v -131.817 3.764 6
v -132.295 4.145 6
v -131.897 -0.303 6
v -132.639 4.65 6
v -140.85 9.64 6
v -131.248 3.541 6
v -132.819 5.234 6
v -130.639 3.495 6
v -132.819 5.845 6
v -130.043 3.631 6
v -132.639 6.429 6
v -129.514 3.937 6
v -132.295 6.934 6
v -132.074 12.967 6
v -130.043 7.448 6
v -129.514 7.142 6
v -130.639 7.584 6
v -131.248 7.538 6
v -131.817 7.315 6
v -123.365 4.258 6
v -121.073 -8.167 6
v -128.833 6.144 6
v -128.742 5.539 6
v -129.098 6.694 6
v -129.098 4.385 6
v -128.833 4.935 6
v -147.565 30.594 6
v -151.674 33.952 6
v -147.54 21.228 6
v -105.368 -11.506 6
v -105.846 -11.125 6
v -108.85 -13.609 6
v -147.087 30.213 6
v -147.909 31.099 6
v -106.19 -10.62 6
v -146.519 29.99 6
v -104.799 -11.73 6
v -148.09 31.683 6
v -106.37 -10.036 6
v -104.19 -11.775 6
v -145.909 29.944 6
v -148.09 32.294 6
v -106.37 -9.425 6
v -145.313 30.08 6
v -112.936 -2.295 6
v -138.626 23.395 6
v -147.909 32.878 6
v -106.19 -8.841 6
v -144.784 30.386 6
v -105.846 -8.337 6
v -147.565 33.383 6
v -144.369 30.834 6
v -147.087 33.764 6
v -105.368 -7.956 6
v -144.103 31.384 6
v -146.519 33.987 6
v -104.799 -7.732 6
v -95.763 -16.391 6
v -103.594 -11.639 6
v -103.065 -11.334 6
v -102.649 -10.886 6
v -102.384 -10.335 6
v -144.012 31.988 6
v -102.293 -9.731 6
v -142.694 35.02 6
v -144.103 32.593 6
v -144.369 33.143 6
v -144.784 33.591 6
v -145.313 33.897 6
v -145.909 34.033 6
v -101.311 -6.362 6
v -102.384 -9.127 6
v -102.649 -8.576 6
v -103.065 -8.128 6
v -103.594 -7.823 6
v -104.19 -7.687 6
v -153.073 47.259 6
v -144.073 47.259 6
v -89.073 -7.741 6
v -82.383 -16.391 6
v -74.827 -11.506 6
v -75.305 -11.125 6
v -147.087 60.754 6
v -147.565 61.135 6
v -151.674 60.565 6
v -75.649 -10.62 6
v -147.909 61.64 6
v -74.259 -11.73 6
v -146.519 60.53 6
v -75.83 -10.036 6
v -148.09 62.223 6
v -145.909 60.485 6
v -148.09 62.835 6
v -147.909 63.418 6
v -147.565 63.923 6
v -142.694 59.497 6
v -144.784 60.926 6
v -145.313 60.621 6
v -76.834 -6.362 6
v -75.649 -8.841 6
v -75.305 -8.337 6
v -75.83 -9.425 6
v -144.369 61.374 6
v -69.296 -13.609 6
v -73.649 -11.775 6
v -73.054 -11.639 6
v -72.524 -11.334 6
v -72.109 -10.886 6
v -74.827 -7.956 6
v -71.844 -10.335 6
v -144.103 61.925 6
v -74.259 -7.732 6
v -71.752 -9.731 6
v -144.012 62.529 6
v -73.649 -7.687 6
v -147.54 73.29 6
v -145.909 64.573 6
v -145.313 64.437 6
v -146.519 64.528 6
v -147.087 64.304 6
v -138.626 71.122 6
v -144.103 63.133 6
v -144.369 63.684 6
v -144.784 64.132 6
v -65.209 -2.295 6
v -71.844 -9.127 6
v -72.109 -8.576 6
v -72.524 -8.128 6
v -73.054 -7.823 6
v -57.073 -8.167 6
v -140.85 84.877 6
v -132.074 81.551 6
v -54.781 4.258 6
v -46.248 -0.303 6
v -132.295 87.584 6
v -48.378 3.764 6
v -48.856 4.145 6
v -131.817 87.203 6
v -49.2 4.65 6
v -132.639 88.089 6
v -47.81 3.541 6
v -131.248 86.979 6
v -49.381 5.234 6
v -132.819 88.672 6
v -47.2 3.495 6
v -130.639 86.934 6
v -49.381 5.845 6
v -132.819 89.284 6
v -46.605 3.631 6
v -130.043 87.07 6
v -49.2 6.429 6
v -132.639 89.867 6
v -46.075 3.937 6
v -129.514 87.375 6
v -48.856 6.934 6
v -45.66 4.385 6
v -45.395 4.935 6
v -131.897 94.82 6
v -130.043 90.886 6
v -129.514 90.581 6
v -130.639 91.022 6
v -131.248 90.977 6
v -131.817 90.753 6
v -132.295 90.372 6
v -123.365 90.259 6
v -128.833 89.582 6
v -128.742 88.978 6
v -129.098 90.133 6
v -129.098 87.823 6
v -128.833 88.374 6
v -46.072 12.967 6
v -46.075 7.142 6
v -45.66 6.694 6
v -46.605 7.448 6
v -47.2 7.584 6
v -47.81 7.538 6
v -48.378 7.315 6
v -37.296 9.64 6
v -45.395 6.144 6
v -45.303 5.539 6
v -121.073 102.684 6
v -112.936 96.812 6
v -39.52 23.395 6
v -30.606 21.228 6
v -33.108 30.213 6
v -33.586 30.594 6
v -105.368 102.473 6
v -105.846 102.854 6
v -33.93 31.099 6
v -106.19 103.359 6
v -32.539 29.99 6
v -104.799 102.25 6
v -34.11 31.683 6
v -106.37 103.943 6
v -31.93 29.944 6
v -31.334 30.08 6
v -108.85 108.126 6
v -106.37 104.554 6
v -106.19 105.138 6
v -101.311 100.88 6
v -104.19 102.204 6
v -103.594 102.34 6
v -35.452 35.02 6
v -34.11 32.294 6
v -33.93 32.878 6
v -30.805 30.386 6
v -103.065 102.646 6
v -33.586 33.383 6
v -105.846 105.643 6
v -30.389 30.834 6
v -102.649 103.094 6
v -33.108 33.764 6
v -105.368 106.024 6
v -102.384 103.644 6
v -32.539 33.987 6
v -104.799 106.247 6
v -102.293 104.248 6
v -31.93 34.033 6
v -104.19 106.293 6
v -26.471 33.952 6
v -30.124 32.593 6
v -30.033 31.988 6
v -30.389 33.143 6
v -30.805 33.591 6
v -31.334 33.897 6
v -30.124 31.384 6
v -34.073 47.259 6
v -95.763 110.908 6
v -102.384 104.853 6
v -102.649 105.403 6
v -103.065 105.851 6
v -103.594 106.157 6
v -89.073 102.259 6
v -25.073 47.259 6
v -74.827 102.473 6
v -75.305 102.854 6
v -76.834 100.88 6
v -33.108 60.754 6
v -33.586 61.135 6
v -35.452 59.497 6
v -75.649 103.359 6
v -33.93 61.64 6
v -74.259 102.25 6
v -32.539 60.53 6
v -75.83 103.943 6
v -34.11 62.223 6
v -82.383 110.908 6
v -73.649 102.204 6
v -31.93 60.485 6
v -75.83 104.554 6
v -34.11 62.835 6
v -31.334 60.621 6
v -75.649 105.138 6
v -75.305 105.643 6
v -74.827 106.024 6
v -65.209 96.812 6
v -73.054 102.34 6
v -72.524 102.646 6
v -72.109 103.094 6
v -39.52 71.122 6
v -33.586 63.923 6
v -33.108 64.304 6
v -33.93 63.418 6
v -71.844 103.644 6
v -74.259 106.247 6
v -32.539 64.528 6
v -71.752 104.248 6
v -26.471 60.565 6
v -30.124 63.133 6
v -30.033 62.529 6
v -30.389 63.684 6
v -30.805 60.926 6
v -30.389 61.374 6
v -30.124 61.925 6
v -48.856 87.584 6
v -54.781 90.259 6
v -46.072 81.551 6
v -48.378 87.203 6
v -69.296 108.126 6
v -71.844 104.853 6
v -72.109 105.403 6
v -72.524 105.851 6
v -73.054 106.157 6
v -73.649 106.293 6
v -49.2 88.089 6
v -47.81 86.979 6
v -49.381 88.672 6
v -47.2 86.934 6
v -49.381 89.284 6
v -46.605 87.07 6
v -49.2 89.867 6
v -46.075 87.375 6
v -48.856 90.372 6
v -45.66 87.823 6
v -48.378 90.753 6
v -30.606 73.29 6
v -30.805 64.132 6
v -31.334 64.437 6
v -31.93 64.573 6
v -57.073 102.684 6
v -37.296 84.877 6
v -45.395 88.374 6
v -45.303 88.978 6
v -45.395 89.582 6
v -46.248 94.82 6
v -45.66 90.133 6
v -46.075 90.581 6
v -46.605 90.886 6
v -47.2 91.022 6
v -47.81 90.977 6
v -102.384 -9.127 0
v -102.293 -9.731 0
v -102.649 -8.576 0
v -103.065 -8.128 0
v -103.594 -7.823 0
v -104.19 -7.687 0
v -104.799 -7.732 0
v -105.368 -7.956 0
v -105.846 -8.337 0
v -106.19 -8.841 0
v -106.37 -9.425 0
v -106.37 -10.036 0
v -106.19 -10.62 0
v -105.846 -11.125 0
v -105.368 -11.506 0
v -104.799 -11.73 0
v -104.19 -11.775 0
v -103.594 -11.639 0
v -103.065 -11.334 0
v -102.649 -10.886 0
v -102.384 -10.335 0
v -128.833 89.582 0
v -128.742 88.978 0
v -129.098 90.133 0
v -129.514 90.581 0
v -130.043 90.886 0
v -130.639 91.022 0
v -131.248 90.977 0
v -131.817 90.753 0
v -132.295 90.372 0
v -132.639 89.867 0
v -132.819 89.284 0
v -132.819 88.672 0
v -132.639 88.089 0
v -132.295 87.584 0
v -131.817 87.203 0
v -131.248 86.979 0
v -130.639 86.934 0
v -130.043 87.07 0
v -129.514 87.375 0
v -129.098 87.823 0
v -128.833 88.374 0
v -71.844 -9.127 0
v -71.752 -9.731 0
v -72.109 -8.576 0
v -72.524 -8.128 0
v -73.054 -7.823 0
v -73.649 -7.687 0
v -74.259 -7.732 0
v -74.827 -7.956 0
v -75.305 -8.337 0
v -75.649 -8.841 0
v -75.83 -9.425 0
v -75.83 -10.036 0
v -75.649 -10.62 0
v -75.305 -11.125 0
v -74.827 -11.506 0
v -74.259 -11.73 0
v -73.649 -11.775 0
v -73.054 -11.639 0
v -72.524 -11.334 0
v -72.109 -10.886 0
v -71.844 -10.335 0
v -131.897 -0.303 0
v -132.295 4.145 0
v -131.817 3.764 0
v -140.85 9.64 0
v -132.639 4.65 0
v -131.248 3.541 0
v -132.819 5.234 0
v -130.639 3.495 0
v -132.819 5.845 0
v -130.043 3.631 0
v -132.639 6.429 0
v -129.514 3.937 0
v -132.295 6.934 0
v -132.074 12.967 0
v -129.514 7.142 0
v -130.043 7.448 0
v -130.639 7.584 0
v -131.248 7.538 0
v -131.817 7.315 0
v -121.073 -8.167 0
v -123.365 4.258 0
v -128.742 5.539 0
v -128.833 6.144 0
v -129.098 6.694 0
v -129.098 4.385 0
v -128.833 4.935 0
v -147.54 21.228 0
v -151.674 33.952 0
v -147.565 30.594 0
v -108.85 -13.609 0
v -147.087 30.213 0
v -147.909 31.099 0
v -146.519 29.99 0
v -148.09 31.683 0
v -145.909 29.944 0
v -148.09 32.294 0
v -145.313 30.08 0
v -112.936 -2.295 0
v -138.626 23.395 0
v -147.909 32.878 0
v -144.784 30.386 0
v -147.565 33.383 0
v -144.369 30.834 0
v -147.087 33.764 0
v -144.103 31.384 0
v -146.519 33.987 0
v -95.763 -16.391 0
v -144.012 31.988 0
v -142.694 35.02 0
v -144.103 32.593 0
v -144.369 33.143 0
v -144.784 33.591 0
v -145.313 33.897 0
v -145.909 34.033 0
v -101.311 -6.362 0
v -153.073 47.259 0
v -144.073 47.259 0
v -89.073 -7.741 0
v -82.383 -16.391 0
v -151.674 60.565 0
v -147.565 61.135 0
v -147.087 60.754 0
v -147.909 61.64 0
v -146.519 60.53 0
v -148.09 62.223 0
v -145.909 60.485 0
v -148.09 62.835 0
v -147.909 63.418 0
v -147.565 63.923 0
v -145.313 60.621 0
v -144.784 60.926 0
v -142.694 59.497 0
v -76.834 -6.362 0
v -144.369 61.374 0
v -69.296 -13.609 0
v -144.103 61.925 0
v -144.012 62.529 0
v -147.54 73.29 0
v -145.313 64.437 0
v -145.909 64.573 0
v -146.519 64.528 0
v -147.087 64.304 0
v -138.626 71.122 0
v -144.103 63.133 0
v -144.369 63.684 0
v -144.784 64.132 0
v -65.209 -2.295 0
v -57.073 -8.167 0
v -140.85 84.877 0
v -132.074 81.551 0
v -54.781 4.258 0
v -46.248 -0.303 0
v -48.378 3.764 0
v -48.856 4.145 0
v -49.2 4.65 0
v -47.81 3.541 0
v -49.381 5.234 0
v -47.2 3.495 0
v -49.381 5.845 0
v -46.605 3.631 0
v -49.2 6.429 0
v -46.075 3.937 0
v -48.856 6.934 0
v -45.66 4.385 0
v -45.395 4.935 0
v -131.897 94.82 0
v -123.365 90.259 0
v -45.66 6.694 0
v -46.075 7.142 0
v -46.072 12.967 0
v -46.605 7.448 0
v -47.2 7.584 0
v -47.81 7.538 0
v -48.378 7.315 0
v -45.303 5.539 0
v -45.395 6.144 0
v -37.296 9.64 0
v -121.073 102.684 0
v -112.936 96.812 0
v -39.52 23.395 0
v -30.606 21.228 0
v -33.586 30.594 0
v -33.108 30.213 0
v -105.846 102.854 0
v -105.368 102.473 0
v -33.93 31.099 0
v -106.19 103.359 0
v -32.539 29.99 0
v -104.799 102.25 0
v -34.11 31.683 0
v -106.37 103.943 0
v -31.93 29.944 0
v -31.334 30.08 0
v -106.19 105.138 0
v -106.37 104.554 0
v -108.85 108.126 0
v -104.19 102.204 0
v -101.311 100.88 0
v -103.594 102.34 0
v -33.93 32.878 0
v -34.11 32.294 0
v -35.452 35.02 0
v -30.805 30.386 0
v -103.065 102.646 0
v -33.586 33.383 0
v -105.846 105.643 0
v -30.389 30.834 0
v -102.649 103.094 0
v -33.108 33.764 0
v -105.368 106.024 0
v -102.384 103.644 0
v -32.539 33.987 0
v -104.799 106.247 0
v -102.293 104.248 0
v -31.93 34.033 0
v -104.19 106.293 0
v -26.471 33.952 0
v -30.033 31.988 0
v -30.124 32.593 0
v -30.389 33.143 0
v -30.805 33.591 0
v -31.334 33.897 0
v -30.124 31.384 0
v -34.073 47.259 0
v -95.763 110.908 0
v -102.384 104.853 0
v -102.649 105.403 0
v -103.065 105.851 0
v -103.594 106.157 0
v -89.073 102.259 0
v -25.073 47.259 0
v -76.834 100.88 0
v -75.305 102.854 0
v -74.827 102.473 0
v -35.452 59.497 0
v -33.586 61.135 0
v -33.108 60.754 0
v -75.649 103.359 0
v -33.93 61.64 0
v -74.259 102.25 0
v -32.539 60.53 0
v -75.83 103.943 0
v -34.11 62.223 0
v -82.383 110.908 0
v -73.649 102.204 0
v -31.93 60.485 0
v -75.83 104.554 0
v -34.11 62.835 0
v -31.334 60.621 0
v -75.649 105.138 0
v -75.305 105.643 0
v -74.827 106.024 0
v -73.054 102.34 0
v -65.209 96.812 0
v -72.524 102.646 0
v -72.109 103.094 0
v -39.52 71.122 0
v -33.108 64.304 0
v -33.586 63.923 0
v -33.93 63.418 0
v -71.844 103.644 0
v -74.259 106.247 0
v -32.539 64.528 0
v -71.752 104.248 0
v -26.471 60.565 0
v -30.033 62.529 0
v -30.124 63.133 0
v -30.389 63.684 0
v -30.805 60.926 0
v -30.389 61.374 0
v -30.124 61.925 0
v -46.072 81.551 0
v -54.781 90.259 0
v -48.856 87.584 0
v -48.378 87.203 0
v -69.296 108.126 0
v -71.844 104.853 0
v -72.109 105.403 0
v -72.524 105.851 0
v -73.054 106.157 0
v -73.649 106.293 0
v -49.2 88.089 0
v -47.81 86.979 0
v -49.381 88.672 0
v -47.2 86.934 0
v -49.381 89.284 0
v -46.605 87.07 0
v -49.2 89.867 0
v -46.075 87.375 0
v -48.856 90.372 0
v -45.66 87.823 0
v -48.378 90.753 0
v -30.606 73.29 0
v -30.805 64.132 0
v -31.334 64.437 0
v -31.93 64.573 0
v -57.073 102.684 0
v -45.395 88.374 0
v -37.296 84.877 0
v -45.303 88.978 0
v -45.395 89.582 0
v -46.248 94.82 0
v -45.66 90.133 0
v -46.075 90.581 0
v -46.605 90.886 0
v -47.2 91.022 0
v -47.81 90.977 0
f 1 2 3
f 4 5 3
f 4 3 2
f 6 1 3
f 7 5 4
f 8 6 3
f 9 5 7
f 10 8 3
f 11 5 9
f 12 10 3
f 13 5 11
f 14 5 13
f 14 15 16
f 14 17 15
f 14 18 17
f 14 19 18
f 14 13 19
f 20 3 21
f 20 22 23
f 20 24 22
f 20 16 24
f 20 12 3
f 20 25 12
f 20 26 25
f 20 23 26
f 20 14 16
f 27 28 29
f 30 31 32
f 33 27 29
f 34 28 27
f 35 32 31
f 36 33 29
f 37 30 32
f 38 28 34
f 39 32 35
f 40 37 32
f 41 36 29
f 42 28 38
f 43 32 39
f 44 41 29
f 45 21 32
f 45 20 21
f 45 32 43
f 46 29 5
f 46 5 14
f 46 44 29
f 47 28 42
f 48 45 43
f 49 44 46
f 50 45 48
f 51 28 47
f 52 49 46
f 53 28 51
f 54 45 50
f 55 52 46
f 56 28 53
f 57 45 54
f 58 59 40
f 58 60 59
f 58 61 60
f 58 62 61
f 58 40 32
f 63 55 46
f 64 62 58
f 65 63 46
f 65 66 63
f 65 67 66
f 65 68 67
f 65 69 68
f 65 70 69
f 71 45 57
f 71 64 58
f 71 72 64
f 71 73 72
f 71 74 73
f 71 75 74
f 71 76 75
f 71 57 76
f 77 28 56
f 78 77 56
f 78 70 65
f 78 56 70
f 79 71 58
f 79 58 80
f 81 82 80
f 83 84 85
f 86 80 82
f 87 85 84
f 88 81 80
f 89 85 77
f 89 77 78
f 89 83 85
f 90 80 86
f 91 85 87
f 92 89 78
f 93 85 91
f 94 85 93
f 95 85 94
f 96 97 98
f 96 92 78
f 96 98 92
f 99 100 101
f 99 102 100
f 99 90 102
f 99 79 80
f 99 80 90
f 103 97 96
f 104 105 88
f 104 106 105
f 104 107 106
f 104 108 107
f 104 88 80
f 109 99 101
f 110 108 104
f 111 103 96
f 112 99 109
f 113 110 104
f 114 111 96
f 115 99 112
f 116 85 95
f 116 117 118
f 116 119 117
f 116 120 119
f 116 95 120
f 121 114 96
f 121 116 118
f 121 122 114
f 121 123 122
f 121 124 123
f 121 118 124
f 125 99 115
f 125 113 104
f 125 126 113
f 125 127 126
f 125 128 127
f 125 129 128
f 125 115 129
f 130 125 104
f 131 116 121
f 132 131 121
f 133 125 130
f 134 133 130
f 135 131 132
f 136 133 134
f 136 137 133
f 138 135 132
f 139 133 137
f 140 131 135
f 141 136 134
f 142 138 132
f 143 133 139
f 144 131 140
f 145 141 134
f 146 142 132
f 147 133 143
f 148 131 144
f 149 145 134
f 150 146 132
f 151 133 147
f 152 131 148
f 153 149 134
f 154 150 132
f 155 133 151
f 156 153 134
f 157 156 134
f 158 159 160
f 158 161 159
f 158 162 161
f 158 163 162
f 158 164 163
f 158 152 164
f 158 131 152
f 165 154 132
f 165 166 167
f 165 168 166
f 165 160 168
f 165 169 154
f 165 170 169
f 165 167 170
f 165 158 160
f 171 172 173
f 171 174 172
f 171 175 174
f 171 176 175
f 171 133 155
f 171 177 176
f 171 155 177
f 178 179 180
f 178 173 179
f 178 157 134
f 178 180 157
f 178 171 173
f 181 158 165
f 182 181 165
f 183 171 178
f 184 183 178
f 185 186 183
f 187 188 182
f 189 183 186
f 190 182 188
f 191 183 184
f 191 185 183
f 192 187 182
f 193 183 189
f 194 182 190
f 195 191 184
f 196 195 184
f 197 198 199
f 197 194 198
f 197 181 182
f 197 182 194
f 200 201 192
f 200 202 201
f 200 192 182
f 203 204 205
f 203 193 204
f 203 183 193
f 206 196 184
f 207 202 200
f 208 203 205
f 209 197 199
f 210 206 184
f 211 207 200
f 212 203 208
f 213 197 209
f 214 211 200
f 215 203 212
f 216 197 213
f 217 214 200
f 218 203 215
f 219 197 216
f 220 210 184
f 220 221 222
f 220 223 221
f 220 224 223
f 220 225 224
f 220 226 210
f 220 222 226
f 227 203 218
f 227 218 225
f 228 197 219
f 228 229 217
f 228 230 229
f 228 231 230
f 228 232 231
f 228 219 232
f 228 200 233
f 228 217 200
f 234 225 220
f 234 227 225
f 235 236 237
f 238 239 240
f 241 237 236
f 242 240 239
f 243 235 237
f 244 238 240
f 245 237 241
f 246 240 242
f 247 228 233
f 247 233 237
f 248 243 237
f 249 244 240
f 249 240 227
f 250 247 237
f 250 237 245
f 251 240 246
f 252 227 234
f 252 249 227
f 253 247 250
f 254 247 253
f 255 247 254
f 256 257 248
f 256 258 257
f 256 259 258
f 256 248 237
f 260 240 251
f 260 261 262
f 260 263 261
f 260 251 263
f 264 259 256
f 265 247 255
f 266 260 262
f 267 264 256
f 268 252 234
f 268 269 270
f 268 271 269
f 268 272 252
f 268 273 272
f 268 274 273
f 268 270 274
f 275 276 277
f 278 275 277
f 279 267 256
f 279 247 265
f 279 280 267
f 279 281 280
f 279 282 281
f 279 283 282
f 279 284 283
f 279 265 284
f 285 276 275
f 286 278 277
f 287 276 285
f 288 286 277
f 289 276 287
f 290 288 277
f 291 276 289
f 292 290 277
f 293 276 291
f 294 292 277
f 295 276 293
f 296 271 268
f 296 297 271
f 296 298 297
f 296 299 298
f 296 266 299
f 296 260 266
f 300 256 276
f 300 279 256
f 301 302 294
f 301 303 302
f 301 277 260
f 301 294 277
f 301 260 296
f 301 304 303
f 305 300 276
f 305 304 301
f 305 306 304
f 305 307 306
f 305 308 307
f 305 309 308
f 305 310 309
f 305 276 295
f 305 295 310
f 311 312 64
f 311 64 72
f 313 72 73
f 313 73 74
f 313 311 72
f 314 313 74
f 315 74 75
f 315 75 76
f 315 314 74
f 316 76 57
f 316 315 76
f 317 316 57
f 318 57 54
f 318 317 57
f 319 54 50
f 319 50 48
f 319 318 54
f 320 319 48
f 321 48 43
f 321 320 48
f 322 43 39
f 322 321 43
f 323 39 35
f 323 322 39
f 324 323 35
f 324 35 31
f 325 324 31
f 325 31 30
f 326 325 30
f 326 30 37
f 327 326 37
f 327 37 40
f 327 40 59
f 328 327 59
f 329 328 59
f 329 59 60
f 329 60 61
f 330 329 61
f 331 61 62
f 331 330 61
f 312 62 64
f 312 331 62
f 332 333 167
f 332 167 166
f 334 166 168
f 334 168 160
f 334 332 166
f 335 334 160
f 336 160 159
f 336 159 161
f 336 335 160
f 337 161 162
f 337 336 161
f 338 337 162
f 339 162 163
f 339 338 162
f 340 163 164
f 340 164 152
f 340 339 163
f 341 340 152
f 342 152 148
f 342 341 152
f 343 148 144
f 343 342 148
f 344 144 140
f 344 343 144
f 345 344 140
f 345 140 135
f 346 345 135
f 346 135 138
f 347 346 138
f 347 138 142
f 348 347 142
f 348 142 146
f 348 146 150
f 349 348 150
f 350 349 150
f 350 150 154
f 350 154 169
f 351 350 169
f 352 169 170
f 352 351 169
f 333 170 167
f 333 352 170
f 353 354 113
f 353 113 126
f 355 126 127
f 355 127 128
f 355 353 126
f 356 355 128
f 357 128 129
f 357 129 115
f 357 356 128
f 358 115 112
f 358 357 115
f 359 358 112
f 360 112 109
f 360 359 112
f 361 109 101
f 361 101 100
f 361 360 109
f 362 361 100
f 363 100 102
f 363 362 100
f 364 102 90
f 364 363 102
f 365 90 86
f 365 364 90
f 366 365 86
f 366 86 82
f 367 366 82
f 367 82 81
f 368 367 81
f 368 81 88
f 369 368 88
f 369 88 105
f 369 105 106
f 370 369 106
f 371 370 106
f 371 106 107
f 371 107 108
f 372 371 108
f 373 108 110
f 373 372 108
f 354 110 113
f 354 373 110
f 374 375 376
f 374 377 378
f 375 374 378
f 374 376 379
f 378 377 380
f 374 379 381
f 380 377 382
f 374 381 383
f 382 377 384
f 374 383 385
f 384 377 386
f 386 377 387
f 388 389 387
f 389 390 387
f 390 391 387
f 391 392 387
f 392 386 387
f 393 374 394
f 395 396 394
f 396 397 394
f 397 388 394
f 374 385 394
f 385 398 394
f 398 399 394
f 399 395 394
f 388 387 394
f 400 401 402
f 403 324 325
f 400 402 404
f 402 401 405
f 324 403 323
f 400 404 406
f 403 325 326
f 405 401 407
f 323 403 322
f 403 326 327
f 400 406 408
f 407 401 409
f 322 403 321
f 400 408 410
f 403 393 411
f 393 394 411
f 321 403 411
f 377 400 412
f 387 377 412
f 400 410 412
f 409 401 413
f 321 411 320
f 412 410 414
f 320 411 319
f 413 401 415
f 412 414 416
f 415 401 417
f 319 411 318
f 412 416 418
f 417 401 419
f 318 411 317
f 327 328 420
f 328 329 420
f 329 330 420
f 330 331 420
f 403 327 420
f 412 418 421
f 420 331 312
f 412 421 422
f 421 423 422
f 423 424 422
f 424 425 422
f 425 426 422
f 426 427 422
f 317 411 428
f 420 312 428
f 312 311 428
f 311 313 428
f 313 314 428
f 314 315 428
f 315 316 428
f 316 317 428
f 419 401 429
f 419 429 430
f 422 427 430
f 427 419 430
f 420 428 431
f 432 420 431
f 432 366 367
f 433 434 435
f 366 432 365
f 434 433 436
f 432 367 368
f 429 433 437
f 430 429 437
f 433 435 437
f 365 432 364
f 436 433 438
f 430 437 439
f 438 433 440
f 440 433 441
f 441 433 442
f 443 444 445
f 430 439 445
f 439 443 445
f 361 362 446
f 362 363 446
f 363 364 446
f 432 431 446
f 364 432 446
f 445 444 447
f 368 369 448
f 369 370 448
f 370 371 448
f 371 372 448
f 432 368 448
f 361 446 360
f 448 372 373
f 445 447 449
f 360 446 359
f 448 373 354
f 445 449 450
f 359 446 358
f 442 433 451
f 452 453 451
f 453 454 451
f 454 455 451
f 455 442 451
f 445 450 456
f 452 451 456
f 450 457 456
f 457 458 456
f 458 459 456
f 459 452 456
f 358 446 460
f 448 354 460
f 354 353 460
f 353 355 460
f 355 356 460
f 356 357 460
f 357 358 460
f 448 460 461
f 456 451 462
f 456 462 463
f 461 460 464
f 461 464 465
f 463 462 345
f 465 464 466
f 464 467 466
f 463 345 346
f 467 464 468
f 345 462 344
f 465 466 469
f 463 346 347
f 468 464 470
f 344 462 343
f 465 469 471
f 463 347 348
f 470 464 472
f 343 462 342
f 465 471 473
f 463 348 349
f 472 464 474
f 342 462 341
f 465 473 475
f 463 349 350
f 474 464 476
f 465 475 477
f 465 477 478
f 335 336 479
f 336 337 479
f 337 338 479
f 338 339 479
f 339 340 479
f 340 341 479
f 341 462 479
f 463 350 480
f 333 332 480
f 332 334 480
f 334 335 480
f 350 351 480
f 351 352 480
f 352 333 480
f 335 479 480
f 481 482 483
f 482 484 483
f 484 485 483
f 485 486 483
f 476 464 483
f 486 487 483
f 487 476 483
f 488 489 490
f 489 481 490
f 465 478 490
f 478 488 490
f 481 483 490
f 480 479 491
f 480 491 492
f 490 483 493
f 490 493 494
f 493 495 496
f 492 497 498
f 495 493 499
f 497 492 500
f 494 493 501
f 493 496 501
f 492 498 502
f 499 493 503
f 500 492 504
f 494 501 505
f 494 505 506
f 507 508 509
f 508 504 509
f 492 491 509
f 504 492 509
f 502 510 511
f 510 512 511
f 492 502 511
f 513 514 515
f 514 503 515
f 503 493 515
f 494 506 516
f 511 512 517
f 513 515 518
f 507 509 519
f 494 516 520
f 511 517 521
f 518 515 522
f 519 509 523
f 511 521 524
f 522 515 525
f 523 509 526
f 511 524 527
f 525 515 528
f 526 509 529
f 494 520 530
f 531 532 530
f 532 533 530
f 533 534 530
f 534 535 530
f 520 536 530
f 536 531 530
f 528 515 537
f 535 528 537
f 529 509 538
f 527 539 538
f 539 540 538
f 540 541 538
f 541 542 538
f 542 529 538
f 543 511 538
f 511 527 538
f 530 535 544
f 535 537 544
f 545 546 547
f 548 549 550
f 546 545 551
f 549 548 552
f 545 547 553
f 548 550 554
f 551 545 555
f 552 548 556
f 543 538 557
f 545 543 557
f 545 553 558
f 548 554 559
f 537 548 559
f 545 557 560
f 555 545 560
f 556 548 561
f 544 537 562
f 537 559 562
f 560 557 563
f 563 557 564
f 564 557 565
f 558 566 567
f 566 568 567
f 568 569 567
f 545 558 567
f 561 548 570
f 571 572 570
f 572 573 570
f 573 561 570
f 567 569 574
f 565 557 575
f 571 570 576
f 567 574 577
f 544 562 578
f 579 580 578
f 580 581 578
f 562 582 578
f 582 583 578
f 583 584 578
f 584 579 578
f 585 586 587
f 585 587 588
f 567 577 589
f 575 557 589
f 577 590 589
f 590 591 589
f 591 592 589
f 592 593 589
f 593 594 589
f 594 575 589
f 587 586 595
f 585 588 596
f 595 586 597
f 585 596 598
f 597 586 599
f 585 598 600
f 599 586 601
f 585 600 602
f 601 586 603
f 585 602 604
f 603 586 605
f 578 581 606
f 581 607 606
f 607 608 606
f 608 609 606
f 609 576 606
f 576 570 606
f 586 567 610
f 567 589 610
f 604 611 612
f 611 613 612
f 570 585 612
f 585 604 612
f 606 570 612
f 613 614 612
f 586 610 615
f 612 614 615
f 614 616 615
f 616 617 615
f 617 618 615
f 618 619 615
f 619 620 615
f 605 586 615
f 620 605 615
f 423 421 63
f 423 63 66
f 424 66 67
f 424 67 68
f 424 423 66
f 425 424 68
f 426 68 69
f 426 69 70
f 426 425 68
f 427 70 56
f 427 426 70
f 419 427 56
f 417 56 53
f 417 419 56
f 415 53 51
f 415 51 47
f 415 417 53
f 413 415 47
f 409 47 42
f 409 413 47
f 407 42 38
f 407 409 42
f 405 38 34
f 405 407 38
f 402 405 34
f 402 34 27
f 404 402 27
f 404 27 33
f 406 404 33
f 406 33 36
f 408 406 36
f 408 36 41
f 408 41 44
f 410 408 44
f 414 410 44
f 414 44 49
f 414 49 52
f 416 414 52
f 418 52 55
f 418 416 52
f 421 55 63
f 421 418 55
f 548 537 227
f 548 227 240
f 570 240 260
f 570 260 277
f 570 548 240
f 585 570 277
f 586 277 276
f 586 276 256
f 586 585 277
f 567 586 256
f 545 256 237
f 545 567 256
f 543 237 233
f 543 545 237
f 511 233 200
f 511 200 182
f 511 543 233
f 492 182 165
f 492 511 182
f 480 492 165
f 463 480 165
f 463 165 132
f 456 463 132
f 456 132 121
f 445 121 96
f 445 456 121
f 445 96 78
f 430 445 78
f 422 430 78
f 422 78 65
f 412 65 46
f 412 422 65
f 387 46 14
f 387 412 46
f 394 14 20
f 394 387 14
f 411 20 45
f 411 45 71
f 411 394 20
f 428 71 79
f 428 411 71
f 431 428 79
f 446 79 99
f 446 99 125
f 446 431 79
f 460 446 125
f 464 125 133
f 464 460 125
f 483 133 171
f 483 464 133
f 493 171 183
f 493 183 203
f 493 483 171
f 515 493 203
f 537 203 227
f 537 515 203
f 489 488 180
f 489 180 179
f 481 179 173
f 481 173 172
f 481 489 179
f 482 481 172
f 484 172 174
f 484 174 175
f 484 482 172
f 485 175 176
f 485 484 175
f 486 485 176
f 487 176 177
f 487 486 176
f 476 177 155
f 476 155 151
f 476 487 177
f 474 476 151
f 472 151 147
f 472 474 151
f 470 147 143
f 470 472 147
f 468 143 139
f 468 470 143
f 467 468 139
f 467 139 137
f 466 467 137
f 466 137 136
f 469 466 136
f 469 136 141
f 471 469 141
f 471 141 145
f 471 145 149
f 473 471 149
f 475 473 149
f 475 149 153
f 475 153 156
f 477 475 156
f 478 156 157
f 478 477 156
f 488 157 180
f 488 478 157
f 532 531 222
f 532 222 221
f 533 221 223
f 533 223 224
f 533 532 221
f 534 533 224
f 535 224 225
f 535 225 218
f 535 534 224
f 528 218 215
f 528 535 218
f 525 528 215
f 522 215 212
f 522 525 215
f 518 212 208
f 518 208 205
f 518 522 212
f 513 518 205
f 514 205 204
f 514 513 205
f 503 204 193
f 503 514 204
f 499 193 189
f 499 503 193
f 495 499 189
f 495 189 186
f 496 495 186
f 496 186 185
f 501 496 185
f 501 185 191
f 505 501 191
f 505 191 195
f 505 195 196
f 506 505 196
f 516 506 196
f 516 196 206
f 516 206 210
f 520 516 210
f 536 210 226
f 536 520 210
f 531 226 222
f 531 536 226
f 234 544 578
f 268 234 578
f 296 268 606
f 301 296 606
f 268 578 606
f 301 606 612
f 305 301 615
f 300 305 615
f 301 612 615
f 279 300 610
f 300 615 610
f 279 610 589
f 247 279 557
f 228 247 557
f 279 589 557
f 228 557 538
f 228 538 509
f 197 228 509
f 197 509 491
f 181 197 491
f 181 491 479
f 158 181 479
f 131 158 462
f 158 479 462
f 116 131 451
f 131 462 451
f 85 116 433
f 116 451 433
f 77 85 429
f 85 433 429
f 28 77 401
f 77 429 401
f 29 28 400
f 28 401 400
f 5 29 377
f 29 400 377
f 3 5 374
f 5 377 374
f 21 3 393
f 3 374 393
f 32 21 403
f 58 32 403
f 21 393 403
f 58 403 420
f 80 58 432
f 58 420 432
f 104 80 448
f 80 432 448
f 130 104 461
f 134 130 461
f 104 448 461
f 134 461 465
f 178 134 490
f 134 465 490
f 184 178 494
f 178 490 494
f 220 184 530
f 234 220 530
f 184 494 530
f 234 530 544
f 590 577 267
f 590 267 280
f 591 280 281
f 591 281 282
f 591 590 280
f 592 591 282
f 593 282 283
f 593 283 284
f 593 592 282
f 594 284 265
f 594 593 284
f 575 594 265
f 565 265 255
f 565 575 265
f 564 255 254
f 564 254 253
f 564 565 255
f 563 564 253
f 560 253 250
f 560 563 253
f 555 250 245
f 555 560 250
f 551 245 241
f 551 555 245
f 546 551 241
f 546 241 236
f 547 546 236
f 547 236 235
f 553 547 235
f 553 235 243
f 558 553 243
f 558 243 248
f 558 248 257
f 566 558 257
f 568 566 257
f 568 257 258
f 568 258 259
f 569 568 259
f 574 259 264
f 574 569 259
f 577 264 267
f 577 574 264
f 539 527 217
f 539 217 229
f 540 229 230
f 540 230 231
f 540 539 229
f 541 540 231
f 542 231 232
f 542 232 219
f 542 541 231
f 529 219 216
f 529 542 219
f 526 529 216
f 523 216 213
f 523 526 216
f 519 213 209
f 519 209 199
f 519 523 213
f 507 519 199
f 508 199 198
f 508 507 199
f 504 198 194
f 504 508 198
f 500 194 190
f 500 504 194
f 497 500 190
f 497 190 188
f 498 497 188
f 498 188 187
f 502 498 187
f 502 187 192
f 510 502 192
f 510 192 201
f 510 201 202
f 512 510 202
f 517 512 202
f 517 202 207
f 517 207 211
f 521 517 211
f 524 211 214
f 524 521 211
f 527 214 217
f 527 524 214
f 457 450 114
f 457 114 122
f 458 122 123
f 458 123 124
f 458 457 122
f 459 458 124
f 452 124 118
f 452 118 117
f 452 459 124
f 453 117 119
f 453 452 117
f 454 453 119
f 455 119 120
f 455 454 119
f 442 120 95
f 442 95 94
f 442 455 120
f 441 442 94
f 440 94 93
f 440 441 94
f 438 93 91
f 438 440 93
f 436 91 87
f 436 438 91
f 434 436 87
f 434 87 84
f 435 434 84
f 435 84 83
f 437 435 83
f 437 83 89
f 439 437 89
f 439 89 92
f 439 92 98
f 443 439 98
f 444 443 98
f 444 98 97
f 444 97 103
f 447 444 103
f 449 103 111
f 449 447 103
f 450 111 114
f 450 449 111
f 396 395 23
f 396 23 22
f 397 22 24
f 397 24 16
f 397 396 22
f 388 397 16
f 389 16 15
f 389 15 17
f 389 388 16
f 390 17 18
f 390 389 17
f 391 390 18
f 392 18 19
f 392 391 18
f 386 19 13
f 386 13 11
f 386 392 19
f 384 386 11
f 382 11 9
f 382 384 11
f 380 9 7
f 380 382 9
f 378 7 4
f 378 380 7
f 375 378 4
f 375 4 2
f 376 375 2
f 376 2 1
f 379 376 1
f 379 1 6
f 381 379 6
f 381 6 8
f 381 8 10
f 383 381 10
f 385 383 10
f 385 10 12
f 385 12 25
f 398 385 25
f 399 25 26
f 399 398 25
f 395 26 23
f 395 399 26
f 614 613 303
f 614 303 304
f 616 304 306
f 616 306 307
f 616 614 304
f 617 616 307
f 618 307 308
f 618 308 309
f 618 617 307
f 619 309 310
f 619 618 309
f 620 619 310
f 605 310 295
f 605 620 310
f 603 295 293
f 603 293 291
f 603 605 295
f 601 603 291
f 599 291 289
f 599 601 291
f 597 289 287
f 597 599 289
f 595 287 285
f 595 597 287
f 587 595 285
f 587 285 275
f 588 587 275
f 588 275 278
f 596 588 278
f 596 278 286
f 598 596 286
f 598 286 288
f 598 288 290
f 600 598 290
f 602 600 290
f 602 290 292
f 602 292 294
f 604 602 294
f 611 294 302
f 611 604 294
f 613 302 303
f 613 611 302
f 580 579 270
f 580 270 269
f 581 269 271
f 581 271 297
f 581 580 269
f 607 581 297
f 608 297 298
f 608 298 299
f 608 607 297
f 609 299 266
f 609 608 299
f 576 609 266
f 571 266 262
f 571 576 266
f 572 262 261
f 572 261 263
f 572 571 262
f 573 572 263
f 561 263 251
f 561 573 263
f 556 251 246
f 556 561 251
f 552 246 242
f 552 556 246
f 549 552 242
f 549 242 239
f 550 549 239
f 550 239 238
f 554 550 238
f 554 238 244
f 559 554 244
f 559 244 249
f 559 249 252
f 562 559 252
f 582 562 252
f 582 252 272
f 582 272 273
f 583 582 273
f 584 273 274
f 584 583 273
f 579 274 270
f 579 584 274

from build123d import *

# Parameters (mm, degrees)
SKETCH1_R           = 64
SKETCH1_R_2         = 55
SKETCH1_R_3         = 2.05
BOSS_EXTRUDE1_DEPTH = 6


with BuildPart() as part:
    # Sketch1 → Boss-Extrude1 (new body)
    with BuildSketch(Plane.XY):
        with Locations((-89.072792821, 47.25870832)):
            Circle(SKETCH1_R)
        with Locations((-89.072792821, 47.25870832)):
            Circle(SKETCH1_R_2, mode=Mode.SUBTRACT)
        with Locations((-32.08316907, 62.529031982)):
            Circle(SKETCH1_R_3, mode=Mode.SUBTRACT)
        with Locations((-32.08316907, 31.988384659)):
            Circle(SKETCH1_R_3, mode=Mode.SUBTRACT)
        with Locations((-47.353492731, 5.53940823)):
            Circle(SKETCH1_R_3, mode=Mode.SUBTRACT)
        with Locations((-73.80246916, -9.730915431)):
            Circle(SKETCH1_R_3, mode=Mode.SUBTRACT)
        with Locations((-104.343116482, -9.730915431)):
            Circle(SKETCH1_R_3, mode=Mode.SUBTRACT)
        with Locations((-130.792092911, 5.53940823)):
            Circle(SKETCH1_R_3, mode=Mode.SUBTRACT)
        with Locations((-146.062416572, 31.988384659)):
            Circle(SKETCH1_R_3, mode=Mode.SUBTRACT)
        with Locations((-146.062416572, 62.529031982)):
            Circle(SKETCH1_R_3, mode=Mode.SUBTRACT)
        with Locations((-130.792092911, 88.978008411)):
            Circle(SKETCH1_R_3, mode=Mode.SUBTRACT)
        with Locations((-104.343116482, 104.248332072)):
            Circle(SKETCH1_R_3, mode=Mode.SUBTRACT)
        with Locations((-73.80246916, 104.248332072)):
            Circle(SKETCH1_R_3, mode=Mode.SUBTRACT)
        with Locations((-47.353492731, 88.978008411)):
            Circle(SKETCH1_R_3, mode=Mode.SUBTRACT)
    extrude(amount=BOSS_EXTRUDE1_DEPTH)


solid = part.part
